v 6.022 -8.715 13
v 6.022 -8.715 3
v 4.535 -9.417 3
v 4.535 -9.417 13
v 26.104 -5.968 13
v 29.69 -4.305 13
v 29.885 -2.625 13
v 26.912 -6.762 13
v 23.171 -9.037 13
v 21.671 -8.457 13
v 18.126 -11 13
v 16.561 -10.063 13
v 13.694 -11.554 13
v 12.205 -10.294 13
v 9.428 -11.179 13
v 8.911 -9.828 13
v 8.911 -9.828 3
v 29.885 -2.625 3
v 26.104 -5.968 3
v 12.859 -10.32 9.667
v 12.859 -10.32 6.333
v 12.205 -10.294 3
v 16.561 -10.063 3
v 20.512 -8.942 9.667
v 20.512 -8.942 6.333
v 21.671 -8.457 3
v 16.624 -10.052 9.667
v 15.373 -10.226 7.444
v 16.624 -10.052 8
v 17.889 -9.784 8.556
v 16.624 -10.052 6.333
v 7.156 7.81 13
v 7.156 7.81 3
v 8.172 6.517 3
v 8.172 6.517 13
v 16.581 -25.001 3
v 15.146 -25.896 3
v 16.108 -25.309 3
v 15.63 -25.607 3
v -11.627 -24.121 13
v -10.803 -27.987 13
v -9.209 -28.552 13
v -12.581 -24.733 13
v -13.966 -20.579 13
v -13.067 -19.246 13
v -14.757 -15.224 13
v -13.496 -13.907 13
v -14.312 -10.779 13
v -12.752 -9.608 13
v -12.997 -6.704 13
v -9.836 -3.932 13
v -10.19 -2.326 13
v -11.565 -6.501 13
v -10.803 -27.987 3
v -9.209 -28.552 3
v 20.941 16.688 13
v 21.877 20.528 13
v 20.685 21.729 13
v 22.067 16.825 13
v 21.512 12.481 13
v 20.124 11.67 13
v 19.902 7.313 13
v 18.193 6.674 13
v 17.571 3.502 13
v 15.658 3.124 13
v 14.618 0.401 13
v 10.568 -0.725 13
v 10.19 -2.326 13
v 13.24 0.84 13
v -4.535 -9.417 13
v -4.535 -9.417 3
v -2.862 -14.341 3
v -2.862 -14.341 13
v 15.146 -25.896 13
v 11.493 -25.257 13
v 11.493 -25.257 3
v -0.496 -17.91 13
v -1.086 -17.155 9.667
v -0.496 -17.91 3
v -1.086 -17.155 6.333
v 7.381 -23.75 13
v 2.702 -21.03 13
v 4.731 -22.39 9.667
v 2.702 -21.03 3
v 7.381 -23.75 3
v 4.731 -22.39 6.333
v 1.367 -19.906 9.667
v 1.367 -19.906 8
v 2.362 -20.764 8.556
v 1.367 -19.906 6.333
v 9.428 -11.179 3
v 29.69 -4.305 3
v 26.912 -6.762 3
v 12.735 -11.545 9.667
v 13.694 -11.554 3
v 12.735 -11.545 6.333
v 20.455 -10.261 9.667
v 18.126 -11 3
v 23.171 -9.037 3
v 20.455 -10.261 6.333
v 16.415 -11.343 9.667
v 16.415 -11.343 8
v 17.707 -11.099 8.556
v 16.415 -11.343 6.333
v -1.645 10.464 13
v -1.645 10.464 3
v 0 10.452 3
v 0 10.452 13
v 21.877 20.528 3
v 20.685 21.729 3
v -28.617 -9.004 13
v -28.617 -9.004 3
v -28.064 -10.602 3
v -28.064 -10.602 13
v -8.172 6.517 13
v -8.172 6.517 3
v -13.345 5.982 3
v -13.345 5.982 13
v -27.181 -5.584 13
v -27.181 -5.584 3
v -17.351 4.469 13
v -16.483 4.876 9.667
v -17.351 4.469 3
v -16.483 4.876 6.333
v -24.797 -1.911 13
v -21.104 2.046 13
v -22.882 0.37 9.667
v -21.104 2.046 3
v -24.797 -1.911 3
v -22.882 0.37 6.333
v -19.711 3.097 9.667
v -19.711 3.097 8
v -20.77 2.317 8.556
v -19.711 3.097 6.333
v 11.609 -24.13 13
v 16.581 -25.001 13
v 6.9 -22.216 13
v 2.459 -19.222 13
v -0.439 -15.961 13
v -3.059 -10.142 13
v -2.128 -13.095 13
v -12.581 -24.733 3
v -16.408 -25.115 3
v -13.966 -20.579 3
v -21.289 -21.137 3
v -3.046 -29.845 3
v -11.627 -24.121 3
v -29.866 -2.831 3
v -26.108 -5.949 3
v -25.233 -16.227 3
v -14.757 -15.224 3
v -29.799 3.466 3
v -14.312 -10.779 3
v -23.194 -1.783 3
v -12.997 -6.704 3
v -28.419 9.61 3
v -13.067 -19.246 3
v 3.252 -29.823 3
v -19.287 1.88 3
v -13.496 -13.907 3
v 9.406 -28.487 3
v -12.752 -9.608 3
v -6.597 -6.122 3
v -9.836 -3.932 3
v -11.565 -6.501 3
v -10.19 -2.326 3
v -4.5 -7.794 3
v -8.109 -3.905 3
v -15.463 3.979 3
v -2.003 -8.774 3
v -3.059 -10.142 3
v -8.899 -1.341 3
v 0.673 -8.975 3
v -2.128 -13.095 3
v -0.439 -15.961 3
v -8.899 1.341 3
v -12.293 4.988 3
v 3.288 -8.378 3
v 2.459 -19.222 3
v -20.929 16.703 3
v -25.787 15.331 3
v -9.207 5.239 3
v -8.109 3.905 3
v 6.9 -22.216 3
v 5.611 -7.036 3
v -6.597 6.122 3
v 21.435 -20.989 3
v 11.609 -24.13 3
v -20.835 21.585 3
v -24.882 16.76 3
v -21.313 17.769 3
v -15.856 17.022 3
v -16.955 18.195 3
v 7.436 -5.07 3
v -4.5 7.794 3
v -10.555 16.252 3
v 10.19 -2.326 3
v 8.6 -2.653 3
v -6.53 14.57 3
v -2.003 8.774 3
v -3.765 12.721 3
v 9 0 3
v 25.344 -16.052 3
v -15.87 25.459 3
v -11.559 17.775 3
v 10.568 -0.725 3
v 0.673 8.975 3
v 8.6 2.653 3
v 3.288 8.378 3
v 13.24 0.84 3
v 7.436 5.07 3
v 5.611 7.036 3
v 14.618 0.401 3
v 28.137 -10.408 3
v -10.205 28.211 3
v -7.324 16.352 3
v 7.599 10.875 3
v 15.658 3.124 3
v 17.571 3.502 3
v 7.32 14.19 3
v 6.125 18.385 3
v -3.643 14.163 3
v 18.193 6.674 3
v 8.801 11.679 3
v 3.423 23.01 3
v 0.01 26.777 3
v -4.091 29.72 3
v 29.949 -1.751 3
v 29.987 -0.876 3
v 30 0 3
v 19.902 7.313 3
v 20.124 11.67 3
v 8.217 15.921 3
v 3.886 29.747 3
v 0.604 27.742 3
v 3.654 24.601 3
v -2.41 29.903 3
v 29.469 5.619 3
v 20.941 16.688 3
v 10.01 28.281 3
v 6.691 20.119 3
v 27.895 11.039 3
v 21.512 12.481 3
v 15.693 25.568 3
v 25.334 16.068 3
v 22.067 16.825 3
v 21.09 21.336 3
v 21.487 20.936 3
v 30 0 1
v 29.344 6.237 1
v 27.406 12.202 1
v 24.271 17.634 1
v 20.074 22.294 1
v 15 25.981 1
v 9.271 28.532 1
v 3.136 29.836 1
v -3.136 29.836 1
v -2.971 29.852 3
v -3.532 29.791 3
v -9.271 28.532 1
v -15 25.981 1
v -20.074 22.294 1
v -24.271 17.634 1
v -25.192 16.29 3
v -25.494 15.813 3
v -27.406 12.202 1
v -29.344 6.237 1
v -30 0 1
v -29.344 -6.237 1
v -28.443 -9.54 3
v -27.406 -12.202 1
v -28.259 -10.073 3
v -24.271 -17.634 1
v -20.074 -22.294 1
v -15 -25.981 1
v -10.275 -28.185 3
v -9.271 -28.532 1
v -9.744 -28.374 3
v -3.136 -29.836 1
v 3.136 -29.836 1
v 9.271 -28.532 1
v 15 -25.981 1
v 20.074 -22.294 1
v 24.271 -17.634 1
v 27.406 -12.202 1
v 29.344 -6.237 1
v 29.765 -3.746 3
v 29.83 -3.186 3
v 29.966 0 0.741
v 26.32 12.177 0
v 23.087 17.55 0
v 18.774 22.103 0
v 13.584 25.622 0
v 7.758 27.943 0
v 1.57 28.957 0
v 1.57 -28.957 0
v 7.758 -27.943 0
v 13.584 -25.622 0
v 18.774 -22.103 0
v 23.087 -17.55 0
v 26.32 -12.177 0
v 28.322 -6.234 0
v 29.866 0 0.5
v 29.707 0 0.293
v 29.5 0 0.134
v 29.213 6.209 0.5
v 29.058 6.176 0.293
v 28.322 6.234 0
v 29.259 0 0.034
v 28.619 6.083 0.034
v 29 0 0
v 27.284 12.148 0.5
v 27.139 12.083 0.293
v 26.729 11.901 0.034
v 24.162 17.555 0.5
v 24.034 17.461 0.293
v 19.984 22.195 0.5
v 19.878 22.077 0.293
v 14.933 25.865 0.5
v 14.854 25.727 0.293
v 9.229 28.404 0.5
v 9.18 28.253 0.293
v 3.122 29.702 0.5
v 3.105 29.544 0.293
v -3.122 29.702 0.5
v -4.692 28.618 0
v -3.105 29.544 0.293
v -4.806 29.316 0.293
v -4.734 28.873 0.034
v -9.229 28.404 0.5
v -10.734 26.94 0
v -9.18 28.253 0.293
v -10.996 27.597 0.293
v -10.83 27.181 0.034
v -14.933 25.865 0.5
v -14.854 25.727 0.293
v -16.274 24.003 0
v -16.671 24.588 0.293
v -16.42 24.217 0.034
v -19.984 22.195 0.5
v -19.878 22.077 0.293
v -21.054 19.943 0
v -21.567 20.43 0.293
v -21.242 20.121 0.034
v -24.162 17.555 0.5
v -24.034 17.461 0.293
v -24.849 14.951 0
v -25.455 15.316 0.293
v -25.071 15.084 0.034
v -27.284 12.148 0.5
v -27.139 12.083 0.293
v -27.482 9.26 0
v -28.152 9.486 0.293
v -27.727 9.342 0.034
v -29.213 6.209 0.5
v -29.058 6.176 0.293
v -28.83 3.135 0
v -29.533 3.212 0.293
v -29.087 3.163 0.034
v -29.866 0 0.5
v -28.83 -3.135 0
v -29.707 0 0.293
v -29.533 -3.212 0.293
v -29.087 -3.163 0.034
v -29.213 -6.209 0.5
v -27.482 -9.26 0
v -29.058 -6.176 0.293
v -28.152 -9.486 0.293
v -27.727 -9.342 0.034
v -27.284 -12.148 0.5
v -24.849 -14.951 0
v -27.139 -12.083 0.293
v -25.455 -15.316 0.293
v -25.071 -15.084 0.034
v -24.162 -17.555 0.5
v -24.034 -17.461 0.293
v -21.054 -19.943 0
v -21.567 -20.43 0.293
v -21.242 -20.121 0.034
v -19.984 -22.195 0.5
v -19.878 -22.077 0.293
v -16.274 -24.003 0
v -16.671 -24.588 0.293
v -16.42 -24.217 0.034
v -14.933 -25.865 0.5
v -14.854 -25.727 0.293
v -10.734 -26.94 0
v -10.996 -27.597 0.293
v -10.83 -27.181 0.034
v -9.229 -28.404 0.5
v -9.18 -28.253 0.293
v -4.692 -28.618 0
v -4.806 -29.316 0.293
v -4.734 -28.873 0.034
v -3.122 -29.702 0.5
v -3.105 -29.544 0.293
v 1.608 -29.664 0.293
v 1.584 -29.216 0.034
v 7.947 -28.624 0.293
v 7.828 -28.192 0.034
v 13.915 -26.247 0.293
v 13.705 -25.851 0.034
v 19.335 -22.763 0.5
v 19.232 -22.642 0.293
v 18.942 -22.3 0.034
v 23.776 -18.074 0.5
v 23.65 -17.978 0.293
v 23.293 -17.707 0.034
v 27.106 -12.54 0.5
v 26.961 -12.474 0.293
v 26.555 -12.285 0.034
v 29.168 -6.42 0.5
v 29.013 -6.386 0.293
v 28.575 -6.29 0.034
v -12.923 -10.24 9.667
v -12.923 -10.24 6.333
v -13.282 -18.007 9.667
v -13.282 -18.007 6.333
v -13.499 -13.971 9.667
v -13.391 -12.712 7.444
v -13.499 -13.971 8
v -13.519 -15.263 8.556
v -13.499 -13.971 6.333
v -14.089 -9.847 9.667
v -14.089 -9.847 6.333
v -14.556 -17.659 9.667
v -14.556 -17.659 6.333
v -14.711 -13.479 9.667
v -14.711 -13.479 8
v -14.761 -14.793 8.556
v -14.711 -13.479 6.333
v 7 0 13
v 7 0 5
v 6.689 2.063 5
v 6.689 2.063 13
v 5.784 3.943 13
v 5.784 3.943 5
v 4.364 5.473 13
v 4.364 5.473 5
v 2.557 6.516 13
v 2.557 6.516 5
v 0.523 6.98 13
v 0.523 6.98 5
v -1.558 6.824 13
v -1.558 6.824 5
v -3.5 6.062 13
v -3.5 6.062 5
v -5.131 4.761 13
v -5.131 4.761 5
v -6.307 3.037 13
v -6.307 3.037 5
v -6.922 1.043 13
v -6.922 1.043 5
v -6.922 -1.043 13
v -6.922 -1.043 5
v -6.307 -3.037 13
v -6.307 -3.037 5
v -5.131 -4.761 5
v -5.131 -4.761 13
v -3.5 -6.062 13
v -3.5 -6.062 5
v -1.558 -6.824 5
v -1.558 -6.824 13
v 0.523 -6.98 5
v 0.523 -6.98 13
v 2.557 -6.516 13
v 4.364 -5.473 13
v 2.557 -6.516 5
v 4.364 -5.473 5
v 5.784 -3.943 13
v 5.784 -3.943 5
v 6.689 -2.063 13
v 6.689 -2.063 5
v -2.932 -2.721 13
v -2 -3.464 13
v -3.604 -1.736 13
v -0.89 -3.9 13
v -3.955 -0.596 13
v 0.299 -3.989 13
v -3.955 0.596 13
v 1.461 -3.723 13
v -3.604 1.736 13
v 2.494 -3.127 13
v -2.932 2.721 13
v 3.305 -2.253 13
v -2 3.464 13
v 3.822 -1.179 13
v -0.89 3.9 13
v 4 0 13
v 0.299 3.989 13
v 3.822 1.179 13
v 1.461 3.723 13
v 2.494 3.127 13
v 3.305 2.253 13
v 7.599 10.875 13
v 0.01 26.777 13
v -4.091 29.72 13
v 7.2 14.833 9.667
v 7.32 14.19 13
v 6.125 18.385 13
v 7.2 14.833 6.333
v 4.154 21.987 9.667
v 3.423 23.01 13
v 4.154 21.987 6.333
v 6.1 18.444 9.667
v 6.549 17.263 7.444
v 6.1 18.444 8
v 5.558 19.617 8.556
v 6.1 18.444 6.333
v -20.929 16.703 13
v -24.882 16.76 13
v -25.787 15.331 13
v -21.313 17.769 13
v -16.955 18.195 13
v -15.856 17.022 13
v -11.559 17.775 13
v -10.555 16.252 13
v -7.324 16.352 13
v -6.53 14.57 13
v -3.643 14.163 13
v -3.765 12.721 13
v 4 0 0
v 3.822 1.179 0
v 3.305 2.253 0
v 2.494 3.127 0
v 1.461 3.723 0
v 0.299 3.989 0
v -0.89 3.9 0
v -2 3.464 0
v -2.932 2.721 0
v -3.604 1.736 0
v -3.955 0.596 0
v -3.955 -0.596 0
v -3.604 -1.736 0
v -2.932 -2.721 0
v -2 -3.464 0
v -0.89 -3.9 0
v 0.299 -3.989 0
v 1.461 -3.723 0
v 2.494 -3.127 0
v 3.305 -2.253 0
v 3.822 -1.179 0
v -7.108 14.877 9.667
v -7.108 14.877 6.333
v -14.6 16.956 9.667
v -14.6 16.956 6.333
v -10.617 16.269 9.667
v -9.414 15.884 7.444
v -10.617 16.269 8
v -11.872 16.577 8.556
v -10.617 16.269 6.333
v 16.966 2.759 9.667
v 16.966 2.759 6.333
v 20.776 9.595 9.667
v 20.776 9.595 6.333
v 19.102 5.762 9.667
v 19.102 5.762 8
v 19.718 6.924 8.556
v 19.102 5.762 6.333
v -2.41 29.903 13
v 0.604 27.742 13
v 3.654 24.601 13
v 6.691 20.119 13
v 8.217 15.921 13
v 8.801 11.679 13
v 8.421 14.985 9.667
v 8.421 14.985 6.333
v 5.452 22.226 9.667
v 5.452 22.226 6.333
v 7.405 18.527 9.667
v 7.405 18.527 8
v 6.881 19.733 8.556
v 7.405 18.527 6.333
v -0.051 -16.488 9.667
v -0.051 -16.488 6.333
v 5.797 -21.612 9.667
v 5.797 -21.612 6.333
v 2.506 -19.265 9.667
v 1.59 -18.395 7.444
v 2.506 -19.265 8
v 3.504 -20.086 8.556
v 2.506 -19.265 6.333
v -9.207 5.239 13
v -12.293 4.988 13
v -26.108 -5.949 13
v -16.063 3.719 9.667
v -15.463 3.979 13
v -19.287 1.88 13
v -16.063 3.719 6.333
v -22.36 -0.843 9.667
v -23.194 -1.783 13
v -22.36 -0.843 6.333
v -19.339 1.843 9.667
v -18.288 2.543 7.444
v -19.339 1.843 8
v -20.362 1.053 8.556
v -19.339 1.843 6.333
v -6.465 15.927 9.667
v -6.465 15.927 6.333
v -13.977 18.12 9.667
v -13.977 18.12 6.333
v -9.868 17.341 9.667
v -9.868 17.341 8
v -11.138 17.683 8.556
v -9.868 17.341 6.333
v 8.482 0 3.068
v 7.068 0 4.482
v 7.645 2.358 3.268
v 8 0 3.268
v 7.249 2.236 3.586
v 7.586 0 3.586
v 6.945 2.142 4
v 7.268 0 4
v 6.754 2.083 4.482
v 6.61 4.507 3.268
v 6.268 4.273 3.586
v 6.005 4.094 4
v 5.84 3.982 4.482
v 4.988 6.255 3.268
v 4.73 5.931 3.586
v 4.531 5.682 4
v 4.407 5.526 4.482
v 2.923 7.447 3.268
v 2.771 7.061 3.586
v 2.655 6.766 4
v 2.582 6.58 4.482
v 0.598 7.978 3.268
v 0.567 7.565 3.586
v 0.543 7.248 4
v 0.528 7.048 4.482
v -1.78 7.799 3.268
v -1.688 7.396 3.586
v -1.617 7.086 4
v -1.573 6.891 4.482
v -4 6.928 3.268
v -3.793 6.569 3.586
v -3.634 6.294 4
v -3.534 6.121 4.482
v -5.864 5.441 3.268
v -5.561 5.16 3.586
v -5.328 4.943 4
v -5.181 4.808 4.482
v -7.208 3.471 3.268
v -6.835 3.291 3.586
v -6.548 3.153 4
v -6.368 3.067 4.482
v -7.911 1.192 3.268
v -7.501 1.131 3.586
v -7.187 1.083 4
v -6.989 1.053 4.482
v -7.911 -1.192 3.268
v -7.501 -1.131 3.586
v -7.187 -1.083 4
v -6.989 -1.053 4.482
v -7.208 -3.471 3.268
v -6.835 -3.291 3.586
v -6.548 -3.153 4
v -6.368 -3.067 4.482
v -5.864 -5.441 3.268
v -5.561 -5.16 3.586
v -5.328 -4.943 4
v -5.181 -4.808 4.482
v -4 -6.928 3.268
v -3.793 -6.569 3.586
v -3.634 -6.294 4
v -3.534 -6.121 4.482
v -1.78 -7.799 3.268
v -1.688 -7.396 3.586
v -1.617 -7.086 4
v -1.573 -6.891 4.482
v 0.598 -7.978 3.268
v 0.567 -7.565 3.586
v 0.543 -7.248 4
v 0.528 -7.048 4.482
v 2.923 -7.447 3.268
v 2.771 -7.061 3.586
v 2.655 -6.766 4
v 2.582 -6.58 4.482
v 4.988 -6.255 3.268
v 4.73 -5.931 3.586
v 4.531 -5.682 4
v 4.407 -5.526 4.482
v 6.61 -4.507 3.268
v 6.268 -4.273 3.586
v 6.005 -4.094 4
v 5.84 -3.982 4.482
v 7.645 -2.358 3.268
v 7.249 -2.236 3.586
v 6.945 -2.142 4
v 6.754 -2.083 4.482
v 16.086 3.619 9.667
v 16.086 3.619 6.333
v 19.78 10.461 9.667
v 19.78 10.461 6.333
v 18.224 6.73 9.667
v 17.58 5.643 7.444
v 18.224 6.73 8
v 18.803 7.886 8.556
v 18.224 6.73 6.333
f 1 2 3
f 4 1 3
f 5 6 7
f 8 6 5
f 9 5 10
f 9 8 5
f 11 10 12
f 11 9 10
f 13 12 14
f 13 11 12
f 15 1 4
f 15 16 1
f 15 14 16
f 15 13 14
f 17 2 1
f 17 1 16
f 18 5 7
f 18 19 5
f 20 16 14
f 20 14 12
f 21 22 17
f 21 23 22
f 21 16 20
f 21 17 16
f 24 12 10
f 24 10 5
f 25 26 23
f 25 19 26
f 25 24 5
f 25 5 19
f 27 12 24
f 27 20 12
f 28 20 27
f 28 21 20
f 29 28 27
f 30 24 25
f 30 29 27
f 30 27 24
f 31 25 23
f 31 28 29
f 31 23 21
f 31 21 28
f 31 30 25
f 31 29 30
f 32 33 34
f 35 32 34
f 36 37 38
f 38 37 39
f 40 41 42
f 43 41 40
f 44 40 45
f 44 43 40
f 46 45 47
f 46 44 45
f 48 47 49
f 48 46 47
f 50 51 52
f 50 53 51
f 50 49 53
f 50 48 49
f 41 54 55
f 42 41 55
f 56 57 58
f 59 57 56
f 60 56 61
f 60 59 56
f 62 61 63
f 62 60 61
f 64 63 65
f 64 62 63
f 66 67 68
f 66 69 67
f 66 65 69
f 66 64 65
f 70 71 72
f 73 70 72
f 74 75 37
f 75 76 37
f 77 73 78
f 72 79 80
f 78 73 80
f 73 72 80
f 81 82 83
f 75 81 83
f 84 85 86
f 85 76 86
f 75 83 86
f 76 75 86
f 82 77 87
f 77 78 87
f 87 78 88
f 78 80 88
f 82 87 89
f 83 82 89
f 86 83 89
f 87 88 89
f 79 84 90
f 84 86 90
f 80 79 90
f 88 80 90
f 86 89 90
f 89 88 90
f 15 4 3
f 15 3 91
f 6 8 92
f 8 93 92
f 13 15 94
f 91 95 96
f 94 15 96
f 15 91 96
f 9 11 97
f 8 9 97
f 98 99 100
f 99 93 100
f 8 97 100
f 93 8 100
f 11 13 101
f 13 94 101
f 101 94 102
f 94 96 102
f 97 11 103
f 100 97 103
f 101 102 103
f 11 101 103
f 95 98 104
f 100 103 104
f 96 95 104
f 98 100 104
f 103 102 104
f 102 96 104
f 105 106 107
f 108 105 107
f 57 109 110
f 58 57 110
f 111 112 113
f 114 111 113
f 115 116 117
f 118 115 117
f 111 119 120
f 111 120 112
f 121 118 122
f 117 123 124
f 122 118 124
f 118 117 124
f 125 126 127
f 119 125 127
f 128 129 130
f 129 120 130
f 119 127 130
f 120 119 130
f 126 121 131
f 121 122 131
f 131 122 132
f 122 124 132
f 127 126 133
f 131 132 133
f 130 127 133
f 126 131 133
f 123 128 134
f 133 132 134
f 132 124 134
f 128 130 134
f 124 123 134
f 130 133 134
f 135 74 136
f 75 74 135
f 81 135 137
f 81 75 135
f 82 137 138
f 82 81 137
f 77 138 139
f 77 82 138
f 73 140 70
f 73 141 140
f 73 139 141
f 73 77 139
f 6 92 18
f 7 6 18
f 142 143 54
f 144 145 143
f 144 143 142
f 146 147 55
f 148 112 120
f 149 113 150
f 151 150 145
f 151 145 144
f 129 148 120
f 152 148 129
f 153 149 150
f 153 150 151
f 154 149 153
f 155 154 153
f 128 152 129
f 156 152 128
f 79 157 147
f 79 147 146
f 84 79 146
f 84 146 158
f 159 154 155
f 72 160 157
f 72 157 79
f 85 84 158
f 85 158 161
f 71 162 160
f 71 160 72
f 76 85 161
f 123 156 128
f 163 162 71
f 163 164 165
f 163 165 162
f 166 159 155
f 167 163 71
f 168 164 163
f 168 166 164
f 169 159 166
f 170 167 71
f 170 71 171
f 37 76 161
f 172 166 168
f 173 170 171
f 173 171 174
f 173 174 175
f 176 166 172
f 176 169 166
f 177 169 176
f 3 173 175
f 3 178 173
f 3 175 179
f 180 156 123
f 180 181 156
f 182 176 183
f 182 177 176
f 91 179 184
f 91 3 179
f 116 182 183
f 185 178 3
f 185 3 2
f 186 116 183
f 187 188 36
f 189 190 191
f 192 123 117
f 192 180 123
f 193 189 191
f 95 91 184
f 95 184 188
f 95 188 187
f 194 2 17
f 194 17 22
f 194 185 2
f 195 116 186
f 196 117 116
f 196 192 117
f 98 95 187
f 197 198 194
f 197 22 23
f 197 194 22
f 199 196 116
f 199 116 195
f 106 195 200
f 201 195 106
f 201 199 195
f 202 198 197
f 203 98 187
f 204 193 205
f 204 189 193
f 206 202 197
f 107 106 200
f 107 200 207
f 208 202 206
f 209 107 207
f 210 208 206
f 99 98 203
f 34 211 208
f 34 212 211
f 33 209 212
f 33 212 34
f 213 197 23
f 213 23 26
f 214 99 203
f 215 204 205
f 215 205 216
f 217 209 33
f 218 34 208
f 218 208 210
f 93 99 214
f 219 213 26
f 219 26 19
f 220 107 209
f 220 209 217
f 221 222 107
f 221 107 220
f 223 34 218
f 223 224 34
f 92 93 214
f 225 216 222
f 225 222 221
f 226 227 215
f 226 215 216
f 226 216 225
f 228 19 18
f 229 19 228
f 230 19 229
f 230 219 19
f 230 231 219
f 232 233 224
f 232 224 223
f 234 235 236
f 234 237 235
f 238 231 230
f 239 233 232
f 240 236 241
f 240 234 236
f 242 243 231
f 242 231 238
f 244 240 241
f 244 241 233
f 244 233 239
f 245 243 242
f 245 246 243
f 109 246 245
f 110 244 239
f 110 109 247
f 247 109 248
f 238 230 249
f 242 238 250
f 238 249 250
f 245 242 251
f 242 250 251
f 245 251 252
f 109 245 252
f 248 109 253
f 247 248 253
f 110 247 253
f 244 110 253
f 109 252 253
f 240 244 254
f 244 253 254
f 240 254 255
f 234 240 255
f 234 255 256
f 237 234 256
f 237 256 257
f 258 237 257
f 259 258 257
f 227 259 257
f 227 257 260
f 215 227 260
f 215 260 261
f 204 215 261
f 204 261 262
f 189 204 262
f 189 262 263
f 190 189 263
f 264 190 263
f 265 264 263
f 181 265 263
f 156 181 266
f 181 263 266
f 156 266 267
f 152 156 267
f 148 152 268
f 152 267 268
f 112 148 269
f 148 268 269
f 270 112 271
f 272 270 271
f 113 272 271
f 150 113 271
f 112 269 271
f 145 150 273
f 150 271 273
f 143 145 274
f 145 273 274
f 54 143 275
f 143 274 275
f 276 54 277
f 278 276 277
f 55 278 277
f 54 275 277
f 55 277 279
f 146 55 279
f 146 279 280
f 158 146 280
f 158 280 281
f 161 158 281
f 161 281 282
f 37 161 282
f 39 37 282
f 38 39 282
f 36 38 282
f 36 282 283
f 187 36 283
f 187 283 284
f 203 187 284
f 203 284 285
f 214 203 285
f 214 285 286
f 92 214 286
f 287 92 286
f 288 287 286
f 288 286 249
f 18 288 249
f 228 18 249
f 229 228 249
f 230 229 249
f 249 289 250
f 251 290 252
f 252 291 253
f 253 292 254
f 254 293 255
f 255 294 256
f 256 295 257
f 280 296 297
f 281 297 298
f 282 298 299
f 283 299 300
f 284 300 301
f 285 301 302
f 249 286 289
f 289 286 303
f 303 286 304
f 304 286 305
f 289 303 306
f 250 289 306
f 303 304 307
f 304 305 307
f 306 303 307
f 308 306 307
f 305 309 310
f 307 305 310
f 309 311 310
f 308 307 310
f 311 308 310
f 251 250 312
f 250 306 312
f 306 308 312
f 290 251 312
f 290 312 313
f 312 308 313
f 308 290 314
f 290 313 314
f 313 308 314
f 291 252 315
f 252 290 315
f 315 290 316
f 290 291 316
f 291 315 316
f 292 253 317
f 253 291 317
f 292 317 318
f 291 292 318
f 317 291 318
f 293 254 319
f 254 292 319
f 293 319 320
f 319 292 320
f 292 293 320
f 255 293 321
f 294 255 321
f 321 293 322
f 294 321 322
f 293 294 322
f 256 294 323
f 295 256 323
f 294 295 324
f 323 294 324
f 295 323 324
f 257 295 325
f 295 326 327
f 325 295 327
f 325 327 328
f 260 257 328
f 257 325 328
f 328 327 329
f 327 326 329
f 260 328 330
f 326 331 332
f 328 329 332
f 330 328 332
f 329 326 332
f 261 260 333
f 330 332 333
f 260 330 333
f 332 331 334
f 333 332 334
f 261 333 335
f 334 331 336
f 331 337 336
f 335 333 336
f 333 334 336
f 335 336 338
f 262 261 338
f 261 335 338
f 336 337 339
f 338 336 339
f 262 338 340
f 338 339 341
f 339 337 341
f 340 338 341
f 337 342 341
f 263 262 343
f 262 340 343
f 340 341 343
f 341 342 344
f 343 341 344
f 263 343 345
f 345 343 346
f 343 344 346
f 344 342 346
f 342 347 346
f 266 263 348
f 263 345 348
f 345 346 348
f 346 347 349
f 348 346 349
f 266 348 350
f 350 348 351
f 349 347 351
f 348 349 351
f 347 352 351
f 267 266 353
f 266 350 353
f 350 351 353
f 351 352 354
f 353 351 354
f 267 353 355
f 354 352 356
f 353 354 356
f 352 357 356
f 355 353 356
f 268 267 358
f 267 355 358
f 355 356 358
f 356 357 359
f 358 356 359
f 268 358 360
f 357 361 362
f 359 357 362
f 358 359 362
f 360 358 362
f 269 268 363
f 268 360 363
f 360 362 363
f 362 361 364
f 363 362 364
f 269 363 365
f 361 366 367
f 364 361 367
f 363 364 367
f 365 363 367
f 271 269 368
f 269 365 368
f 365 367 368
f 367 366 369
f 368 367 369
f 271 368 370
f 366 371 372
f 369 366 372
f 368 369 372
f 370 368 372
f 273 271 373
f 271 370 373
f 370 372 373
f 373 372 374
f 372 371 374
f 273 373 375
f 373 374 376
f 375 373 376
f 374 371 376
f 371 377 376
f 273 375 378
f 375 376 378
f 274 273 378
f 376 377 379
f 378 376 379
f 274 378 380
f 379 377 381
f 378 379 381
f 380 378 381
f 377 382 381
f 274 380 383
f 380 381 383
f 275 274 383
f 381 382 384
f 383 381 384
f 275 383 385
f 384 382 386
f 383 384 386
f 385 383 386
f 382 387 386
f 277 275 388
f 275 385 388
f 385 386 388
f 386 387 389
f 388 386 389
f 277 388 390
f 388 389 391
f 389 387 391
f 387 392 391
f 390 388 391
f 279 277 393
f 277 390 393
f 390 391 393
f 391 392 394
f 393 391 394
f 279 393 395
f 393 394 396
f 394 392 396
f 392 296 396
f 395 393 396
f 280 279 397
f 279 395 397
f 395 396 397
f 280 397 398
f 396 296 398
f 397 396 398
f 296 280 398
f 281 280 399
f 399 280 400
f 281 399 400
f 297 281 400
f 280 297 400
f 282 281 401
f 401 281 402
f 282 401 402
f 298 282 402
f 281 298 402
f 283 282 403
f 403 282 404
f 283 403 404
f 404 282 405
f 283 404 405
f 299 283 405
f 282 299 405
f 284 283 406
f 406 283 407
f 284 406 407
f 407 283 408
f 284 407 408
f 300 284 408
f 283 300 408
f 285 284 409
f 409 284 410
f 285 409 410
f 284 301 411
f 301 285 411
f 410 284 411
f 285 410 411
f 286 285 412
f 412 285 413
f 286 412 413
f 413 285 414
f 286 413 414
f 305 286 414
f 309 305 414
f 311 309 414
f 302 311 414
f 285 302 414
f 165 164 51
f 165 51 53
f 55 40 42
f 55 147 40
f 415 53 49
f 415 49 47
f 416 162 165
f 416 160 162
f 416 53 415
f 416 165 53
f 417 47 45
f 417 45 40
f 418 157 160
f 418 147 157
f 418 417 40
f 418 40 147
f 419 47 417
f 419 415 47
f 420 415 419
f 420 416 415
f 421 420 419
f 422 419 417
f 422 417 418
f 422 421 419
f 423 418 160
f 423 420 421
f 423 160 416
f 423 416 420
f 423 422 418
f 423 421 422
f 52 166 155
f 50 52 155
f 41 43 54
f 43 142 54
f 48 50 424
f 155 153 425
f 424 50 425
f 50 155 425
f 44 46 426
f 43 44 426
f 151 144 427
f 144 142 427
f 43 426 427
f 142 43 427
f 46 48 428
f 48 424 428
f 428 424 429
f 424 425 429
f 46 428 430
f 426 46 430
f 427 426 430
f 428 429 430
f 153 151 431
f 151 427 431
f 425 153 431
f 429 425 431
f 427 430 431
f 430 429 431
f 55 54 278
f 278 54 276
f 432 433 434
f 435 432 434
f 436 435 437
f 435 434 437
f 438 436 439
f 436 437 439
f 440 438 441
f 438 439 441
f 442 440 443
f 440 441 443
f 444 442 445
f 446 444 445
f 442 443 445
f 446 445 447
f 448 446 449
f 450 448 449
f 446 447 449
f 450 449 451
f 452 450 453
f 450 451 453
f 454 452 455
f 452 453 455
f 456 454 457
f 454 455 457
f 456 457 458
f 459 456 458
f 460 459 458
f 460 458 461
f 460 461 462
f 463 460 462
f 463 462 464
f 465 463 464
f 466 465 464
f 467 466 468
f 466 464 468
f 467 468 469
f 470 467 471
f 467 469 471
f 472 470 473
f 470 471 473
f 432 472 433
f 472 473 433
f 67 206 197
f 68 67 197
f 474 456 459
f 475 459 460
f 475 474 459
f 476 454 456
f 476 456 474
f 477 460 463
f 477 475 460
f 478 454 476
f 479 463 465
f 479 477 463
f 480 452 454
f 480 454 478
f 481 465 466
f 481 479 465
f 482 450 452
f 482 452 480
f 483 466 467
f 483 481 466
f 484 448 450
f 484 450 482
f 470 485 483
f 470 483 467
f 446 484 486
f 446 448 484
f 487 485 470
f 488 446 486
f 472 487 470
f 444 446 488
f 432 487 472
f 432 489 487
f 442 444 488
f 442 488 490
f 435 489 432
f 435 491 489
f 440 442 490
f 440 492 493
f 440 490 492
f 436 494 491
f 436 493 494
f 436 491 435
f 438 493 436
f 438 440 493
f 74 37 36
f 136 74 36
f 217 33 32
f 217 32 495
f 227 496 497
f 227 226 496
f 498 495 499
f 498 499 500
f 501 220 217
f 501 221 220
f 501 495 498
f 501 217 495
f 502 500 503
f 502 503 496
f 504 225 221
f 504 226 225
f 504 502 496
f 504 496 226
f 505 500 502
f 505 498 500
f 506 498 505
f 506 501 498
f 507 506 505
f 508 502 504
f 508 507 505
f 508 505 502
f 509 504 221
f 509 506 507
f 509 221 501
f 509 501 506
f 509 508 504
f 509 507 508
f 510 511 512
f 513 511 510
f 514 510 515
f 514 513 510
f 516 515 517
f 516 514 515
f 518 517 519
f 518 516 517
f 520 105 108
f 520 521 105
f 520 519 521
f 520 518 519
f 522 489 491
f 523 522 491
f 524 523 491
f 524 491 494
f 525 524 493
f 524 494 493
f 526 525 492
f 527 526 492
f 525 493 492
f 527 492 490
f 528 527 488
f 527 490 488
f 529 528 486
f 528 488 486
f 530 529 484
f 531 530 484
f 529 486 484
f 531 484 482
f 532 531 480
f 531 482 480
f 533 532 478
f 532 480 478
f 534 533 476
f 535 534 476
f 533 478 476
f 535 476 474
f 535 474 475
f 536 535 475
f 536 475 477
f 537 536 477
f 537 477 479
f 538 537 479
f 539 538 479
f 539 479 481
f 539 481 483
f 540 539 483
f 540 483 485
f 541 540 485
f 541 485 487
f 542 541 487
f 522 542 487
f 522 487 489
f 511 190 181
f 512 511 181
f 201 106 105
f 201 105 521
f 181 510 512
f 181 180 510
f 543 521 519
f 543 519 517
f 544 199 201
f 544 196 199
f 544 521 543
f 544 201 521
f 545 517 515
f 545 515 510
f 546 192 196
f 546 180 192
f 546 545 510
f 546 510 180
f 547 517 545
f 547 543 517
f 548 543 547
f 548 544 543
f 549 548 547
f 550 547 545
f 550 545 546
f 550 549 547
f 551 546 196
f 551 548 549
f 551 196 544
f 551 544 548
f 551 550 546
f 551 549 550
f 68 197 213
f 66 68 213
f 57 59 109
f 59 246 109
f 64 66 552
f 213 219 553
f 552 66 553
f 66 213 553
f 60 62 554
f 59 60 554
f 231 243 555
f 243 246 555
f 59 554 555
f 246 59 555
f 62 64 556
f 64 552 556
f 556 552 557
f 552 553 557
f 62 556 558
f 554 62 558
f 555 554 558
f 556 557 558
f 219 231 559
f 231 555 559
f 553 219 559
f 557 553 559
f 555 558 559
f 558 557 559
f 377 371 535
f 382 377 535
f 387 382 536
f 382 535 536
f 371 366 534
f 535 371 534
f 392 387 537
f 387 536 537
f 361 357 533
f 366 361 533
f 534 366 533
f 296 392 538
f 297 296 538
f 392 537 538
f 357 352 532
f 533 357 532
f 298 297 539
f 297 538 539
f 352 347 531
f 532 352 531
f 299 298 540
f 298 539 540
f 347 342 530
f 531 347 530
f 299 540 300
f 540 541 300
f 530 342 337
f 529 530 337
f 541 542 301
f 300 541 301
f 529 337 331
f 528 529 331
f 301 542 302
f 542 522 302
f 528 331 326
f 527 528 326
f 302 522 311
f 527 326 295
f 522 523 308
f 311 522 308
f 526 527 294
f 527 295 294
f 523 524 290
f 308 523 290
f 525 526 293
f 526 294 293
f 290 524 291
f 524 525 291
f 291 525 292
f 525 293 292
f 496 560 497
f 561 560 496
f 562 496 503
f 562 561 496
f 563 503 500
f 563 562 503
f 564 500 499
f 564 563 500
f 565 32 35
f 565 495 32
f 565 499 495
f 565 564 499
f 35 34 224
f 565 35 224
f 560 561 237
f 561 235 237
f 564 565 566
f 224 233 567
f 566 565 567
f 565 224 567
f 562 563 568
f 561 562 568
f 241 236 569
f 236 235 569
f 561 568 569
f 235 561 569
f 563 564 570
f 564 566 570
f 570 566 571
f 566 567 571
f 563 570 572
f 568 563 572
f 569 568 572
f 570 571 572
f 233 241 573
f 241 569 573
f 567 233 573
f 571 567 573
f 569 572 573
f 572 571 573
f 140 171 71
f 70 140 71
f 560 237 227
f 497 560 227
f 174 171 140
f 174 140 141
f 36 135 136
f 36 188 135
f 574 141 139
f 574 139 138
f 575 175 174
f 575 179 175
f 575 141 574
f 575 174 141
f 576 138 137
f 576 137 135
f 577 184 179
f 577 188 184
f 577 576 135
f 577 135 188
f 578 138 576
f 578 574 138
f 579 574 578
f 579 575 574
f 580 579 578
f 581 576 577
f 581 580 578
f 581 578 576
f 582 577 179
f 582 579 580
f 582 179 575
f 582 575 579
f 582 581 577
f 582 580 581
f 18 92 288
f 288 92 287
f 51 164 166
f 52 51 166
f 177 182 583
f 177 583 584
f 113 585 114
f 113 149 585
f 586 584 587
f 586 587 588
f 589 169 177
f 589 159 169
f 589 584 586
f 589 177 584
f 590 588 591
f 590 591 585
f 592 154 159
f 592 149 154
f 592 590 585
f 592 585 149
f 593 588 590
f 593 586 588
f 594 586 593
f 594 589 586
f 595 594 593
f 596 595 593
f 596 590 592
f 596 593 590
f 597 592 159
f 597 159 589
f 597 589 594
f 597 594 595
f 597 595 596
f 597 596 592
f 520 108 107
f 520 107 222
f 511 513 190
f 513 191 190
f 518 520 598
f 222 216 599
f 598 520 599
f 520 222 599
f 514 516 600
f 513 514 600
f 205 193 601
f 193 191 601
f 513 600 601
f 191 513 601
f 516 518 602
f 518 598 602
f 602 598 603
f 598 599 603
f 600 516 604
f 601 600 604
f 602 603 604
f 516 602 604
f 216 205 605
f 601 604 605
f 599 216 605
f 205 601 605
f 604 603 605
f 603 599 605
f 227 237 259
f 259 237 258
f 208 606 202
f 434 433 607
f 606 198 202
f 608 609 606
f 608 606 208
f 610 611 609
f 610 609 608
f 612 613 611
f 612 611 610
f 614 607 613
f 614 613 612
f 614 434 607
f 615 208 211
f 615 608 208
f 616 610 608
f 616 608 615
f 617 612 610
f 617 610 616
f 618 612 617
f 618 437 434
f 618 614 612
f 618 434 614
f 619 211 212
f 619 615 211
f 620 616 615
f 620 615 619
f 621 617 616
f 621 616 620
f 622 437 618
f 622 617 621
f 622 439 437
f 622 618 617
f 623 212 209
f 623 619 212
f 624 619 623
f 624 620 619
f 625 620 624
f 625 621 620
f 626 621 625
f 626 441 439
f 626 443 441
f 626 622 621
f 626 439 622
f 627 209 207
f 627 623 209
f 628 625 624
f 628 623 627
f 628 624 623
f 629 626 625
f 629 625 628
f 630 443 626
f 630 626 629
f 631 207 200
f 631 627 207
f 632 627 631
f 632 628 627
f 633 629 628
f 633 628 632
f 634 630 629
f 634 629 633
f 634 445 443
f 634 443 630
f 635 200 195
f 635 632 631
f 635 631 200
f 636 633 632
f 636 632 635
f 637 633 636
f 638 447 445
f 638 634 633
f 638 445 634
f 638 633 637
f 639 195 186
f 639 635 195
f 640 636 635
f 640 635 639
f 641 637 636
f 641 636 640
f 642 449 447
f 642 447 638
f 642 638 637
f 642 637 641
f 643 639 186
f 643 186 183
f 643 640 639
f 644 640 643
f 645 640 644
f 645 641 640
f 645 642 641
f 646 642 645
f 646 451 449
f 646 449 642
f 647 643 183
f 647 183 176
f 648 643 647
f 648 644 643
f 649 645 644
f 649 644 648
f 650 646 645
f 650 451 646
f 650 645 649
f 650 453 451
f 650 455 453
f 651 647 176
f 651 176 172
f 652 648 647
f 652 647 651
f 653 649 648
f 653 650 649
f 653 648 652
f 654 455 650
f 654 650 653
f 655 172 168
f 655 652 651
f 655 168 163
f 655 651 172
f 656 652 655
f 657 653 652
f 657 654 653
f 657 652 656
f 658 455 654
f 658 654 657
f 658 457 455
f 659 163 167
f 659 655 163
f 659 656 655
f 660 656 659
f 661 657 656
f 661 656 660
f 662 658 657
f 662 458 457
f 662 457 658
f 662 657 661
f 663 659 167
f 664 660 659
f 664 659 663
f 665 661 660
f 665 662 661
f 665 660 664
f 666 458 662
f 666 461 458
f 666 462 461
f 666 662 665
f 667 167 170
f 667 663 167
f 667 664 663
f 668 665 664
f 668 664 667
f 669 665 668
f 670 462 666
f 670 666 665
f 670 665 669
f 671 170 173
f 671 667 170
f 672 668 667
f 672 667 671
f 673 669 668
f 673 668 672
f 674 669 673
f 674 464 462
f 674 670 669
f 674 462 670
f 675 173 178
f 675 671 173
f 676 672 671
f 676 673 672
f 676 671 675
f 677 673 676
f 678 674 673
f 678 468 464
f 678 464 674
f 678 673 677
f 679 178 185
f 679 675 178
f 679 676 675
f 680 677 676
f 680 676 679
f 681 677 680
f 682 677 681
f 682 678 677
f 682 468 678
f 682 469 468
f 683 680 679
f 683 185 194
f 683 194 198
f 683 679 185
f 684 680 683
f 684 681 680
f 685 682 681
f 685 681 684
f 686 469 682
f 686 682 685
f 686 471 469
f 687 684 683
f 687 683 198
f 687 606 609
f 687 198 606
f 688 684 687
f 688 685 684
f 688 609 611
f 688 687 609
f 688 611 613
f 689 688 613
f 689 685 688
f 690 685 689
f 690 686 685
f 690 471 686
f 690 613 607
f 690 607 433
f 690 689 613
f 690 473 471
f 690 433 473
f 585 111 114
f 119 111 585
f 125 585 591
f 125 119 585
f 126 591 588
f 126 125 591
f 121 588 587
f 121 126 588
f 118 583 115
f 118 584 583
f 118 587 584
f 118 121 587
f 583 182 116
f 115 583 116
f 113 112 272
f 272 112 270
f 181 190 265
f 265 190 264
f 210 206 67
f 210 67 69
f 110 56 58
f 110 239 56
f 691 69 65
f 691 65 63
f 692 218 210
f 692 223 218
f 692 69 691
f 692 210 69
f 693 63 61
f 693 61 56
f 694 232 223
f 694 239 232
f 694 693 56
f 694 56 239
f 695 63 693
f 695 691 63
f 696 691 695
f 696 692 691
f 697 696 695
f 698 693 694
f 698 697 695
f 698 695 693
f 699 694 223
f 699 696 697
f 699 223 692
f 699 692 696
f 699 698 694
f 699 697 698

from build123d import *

# Parameters (mm, degrees)
F0_R     = 30
F1_DEPTH = 3
F3_DEPTH = 10
F5_COUNT = 7
F6_R     = 7
F7_DEPTH = 10
F8_R     = 4
F9_DEPTH = 13.001
F10_R    = 1
F11_R    = 2


with BuildPart() as f1:
    # F0 (on Top) → F1 (new body)
    with BuildSketch(Plane.XY):
        Circle(F0_R)
    extrude(amount=F1_DEPTH)

    # F2 (on face) → F3 (join)
    with BuildSketch(Plane.XY.offset(3)):
        with BuildLine():
            Line((-1.6446796944, 10.4644708335), (0, 10.4520414025))
            add(Edge.make_bspline(
                [(0, 10.4520414025), (-2.2289291518, 13.3403059975), (-6.1904321331, 16.1620932905), (-13.6442423507, 18.8532101818), (-22.3243720829, 17.9140381515), (-24.8817240251, 16.7600659168)],
                knots=[0, 0, 0, 0, 0.3225761243, 0.6326131084, 1, 1, 1, 1], degree=3))
            Line((-24.8817240251, 16.7600659168), (-25.7866161055, 15.3313544682))
            add(Edge.make_bspline(
                [(-1.6446796944, 10.4644708335), (-2.8414923982, 12.2416667658), (-7.1707724103, 15.3826694675), (-14.4971888519, 17.5675164501), (-22.4425556004, 16.8143108506), (-25.7866161055, 15.3313544682)],
                knots=[0, 0, 0, 0, 0.3011184154, 0.6179723344, 1, 1, 1, 1], degree=3))
        make_face()
    extrude(amount=F3_DEPTH)


with BuildPart() as f5_1:
    # F5: instance of F1
    add(f1.part.rotate(Axis((0, 0, 22.8564720601), (0, 0, 1)), 1 * 360 / F5_COUNT))


with BuildPart() as f5_2:
    # F5: instance of F1
    add(f1.part.rotate(Axis((0, 0, 22.8564720601), (0, 0, 1)), 2 * 360 / F5_COUNT))


with BuildPart() as f5_3:
    # F5: instance of F1
    add(f1.part.rotate(Axis((0, 0, 22.8564720601), (0, 0, 1)), 3 * 360 / F5_COUNT))


with BuildPart() as f5_4:
    # F5: instance of F1
    add(f1.part.rotate(Axis((0, 0, 22.8564720601), (0, 0, 1)), 4 * 360 / F5_COUNT))


with BuildPart() as f5_5:
    # F5: instance of F1
    add(f1.part.rotate(Axis((0, 0, 22.8564720601), (0, 0, 1)), 5 * 360 / F5_COUNT))


with BuildPart() as f5_6:
    # F5: instance of F1
    add(f1.part.rotate(Axis((0, 0, 22.8564720601), (0, 0, 1)), 6 * 360 / F5_COUNT))


with BuildPart() as f1_1:
    add(f1.part)

    add(f5_1.part)  # F7 merges F5_1

    add(f5_2.part)  # F7 merges F5_2

    add(f5_3.part)  # F7 merges F5_3

    add(f5_4.part)  # F7 merges F5_4

    add(f5_5.part)  # F7 merges F5_5

    add(f5_6.part)  # F7 merges F5_6
    # F6 (on face) → F7 (join)
    with BuildSketch(Plane.XY.offset(3)):
        Circle(F6_R)
    extrude(amount=F7_DEPTH)

    # F8 (on face) → F9 (cut, through all)
    with BuildSketch(Plane.XY.offset(13)):
        Circle(F8_R)
    extrude(amount=-F9_DEPTH, mode=Mode.SUBTRACT)

    # F10
    f10_edges = [f1_1.edges().sort_by_distance(p)[0] for p in [
        (-18.704694, 23.454944, 0),
    ]]
    fillet(f10_edges, radius=F10_R)

    # F11
    f11_edges = [f1_1.edges().sort_by_distance(p)[0] for p in [
        (-7, 0, 3),
    ]]
    fillet(f11_edges, radius=F11_R)


solid = f1_1.part
